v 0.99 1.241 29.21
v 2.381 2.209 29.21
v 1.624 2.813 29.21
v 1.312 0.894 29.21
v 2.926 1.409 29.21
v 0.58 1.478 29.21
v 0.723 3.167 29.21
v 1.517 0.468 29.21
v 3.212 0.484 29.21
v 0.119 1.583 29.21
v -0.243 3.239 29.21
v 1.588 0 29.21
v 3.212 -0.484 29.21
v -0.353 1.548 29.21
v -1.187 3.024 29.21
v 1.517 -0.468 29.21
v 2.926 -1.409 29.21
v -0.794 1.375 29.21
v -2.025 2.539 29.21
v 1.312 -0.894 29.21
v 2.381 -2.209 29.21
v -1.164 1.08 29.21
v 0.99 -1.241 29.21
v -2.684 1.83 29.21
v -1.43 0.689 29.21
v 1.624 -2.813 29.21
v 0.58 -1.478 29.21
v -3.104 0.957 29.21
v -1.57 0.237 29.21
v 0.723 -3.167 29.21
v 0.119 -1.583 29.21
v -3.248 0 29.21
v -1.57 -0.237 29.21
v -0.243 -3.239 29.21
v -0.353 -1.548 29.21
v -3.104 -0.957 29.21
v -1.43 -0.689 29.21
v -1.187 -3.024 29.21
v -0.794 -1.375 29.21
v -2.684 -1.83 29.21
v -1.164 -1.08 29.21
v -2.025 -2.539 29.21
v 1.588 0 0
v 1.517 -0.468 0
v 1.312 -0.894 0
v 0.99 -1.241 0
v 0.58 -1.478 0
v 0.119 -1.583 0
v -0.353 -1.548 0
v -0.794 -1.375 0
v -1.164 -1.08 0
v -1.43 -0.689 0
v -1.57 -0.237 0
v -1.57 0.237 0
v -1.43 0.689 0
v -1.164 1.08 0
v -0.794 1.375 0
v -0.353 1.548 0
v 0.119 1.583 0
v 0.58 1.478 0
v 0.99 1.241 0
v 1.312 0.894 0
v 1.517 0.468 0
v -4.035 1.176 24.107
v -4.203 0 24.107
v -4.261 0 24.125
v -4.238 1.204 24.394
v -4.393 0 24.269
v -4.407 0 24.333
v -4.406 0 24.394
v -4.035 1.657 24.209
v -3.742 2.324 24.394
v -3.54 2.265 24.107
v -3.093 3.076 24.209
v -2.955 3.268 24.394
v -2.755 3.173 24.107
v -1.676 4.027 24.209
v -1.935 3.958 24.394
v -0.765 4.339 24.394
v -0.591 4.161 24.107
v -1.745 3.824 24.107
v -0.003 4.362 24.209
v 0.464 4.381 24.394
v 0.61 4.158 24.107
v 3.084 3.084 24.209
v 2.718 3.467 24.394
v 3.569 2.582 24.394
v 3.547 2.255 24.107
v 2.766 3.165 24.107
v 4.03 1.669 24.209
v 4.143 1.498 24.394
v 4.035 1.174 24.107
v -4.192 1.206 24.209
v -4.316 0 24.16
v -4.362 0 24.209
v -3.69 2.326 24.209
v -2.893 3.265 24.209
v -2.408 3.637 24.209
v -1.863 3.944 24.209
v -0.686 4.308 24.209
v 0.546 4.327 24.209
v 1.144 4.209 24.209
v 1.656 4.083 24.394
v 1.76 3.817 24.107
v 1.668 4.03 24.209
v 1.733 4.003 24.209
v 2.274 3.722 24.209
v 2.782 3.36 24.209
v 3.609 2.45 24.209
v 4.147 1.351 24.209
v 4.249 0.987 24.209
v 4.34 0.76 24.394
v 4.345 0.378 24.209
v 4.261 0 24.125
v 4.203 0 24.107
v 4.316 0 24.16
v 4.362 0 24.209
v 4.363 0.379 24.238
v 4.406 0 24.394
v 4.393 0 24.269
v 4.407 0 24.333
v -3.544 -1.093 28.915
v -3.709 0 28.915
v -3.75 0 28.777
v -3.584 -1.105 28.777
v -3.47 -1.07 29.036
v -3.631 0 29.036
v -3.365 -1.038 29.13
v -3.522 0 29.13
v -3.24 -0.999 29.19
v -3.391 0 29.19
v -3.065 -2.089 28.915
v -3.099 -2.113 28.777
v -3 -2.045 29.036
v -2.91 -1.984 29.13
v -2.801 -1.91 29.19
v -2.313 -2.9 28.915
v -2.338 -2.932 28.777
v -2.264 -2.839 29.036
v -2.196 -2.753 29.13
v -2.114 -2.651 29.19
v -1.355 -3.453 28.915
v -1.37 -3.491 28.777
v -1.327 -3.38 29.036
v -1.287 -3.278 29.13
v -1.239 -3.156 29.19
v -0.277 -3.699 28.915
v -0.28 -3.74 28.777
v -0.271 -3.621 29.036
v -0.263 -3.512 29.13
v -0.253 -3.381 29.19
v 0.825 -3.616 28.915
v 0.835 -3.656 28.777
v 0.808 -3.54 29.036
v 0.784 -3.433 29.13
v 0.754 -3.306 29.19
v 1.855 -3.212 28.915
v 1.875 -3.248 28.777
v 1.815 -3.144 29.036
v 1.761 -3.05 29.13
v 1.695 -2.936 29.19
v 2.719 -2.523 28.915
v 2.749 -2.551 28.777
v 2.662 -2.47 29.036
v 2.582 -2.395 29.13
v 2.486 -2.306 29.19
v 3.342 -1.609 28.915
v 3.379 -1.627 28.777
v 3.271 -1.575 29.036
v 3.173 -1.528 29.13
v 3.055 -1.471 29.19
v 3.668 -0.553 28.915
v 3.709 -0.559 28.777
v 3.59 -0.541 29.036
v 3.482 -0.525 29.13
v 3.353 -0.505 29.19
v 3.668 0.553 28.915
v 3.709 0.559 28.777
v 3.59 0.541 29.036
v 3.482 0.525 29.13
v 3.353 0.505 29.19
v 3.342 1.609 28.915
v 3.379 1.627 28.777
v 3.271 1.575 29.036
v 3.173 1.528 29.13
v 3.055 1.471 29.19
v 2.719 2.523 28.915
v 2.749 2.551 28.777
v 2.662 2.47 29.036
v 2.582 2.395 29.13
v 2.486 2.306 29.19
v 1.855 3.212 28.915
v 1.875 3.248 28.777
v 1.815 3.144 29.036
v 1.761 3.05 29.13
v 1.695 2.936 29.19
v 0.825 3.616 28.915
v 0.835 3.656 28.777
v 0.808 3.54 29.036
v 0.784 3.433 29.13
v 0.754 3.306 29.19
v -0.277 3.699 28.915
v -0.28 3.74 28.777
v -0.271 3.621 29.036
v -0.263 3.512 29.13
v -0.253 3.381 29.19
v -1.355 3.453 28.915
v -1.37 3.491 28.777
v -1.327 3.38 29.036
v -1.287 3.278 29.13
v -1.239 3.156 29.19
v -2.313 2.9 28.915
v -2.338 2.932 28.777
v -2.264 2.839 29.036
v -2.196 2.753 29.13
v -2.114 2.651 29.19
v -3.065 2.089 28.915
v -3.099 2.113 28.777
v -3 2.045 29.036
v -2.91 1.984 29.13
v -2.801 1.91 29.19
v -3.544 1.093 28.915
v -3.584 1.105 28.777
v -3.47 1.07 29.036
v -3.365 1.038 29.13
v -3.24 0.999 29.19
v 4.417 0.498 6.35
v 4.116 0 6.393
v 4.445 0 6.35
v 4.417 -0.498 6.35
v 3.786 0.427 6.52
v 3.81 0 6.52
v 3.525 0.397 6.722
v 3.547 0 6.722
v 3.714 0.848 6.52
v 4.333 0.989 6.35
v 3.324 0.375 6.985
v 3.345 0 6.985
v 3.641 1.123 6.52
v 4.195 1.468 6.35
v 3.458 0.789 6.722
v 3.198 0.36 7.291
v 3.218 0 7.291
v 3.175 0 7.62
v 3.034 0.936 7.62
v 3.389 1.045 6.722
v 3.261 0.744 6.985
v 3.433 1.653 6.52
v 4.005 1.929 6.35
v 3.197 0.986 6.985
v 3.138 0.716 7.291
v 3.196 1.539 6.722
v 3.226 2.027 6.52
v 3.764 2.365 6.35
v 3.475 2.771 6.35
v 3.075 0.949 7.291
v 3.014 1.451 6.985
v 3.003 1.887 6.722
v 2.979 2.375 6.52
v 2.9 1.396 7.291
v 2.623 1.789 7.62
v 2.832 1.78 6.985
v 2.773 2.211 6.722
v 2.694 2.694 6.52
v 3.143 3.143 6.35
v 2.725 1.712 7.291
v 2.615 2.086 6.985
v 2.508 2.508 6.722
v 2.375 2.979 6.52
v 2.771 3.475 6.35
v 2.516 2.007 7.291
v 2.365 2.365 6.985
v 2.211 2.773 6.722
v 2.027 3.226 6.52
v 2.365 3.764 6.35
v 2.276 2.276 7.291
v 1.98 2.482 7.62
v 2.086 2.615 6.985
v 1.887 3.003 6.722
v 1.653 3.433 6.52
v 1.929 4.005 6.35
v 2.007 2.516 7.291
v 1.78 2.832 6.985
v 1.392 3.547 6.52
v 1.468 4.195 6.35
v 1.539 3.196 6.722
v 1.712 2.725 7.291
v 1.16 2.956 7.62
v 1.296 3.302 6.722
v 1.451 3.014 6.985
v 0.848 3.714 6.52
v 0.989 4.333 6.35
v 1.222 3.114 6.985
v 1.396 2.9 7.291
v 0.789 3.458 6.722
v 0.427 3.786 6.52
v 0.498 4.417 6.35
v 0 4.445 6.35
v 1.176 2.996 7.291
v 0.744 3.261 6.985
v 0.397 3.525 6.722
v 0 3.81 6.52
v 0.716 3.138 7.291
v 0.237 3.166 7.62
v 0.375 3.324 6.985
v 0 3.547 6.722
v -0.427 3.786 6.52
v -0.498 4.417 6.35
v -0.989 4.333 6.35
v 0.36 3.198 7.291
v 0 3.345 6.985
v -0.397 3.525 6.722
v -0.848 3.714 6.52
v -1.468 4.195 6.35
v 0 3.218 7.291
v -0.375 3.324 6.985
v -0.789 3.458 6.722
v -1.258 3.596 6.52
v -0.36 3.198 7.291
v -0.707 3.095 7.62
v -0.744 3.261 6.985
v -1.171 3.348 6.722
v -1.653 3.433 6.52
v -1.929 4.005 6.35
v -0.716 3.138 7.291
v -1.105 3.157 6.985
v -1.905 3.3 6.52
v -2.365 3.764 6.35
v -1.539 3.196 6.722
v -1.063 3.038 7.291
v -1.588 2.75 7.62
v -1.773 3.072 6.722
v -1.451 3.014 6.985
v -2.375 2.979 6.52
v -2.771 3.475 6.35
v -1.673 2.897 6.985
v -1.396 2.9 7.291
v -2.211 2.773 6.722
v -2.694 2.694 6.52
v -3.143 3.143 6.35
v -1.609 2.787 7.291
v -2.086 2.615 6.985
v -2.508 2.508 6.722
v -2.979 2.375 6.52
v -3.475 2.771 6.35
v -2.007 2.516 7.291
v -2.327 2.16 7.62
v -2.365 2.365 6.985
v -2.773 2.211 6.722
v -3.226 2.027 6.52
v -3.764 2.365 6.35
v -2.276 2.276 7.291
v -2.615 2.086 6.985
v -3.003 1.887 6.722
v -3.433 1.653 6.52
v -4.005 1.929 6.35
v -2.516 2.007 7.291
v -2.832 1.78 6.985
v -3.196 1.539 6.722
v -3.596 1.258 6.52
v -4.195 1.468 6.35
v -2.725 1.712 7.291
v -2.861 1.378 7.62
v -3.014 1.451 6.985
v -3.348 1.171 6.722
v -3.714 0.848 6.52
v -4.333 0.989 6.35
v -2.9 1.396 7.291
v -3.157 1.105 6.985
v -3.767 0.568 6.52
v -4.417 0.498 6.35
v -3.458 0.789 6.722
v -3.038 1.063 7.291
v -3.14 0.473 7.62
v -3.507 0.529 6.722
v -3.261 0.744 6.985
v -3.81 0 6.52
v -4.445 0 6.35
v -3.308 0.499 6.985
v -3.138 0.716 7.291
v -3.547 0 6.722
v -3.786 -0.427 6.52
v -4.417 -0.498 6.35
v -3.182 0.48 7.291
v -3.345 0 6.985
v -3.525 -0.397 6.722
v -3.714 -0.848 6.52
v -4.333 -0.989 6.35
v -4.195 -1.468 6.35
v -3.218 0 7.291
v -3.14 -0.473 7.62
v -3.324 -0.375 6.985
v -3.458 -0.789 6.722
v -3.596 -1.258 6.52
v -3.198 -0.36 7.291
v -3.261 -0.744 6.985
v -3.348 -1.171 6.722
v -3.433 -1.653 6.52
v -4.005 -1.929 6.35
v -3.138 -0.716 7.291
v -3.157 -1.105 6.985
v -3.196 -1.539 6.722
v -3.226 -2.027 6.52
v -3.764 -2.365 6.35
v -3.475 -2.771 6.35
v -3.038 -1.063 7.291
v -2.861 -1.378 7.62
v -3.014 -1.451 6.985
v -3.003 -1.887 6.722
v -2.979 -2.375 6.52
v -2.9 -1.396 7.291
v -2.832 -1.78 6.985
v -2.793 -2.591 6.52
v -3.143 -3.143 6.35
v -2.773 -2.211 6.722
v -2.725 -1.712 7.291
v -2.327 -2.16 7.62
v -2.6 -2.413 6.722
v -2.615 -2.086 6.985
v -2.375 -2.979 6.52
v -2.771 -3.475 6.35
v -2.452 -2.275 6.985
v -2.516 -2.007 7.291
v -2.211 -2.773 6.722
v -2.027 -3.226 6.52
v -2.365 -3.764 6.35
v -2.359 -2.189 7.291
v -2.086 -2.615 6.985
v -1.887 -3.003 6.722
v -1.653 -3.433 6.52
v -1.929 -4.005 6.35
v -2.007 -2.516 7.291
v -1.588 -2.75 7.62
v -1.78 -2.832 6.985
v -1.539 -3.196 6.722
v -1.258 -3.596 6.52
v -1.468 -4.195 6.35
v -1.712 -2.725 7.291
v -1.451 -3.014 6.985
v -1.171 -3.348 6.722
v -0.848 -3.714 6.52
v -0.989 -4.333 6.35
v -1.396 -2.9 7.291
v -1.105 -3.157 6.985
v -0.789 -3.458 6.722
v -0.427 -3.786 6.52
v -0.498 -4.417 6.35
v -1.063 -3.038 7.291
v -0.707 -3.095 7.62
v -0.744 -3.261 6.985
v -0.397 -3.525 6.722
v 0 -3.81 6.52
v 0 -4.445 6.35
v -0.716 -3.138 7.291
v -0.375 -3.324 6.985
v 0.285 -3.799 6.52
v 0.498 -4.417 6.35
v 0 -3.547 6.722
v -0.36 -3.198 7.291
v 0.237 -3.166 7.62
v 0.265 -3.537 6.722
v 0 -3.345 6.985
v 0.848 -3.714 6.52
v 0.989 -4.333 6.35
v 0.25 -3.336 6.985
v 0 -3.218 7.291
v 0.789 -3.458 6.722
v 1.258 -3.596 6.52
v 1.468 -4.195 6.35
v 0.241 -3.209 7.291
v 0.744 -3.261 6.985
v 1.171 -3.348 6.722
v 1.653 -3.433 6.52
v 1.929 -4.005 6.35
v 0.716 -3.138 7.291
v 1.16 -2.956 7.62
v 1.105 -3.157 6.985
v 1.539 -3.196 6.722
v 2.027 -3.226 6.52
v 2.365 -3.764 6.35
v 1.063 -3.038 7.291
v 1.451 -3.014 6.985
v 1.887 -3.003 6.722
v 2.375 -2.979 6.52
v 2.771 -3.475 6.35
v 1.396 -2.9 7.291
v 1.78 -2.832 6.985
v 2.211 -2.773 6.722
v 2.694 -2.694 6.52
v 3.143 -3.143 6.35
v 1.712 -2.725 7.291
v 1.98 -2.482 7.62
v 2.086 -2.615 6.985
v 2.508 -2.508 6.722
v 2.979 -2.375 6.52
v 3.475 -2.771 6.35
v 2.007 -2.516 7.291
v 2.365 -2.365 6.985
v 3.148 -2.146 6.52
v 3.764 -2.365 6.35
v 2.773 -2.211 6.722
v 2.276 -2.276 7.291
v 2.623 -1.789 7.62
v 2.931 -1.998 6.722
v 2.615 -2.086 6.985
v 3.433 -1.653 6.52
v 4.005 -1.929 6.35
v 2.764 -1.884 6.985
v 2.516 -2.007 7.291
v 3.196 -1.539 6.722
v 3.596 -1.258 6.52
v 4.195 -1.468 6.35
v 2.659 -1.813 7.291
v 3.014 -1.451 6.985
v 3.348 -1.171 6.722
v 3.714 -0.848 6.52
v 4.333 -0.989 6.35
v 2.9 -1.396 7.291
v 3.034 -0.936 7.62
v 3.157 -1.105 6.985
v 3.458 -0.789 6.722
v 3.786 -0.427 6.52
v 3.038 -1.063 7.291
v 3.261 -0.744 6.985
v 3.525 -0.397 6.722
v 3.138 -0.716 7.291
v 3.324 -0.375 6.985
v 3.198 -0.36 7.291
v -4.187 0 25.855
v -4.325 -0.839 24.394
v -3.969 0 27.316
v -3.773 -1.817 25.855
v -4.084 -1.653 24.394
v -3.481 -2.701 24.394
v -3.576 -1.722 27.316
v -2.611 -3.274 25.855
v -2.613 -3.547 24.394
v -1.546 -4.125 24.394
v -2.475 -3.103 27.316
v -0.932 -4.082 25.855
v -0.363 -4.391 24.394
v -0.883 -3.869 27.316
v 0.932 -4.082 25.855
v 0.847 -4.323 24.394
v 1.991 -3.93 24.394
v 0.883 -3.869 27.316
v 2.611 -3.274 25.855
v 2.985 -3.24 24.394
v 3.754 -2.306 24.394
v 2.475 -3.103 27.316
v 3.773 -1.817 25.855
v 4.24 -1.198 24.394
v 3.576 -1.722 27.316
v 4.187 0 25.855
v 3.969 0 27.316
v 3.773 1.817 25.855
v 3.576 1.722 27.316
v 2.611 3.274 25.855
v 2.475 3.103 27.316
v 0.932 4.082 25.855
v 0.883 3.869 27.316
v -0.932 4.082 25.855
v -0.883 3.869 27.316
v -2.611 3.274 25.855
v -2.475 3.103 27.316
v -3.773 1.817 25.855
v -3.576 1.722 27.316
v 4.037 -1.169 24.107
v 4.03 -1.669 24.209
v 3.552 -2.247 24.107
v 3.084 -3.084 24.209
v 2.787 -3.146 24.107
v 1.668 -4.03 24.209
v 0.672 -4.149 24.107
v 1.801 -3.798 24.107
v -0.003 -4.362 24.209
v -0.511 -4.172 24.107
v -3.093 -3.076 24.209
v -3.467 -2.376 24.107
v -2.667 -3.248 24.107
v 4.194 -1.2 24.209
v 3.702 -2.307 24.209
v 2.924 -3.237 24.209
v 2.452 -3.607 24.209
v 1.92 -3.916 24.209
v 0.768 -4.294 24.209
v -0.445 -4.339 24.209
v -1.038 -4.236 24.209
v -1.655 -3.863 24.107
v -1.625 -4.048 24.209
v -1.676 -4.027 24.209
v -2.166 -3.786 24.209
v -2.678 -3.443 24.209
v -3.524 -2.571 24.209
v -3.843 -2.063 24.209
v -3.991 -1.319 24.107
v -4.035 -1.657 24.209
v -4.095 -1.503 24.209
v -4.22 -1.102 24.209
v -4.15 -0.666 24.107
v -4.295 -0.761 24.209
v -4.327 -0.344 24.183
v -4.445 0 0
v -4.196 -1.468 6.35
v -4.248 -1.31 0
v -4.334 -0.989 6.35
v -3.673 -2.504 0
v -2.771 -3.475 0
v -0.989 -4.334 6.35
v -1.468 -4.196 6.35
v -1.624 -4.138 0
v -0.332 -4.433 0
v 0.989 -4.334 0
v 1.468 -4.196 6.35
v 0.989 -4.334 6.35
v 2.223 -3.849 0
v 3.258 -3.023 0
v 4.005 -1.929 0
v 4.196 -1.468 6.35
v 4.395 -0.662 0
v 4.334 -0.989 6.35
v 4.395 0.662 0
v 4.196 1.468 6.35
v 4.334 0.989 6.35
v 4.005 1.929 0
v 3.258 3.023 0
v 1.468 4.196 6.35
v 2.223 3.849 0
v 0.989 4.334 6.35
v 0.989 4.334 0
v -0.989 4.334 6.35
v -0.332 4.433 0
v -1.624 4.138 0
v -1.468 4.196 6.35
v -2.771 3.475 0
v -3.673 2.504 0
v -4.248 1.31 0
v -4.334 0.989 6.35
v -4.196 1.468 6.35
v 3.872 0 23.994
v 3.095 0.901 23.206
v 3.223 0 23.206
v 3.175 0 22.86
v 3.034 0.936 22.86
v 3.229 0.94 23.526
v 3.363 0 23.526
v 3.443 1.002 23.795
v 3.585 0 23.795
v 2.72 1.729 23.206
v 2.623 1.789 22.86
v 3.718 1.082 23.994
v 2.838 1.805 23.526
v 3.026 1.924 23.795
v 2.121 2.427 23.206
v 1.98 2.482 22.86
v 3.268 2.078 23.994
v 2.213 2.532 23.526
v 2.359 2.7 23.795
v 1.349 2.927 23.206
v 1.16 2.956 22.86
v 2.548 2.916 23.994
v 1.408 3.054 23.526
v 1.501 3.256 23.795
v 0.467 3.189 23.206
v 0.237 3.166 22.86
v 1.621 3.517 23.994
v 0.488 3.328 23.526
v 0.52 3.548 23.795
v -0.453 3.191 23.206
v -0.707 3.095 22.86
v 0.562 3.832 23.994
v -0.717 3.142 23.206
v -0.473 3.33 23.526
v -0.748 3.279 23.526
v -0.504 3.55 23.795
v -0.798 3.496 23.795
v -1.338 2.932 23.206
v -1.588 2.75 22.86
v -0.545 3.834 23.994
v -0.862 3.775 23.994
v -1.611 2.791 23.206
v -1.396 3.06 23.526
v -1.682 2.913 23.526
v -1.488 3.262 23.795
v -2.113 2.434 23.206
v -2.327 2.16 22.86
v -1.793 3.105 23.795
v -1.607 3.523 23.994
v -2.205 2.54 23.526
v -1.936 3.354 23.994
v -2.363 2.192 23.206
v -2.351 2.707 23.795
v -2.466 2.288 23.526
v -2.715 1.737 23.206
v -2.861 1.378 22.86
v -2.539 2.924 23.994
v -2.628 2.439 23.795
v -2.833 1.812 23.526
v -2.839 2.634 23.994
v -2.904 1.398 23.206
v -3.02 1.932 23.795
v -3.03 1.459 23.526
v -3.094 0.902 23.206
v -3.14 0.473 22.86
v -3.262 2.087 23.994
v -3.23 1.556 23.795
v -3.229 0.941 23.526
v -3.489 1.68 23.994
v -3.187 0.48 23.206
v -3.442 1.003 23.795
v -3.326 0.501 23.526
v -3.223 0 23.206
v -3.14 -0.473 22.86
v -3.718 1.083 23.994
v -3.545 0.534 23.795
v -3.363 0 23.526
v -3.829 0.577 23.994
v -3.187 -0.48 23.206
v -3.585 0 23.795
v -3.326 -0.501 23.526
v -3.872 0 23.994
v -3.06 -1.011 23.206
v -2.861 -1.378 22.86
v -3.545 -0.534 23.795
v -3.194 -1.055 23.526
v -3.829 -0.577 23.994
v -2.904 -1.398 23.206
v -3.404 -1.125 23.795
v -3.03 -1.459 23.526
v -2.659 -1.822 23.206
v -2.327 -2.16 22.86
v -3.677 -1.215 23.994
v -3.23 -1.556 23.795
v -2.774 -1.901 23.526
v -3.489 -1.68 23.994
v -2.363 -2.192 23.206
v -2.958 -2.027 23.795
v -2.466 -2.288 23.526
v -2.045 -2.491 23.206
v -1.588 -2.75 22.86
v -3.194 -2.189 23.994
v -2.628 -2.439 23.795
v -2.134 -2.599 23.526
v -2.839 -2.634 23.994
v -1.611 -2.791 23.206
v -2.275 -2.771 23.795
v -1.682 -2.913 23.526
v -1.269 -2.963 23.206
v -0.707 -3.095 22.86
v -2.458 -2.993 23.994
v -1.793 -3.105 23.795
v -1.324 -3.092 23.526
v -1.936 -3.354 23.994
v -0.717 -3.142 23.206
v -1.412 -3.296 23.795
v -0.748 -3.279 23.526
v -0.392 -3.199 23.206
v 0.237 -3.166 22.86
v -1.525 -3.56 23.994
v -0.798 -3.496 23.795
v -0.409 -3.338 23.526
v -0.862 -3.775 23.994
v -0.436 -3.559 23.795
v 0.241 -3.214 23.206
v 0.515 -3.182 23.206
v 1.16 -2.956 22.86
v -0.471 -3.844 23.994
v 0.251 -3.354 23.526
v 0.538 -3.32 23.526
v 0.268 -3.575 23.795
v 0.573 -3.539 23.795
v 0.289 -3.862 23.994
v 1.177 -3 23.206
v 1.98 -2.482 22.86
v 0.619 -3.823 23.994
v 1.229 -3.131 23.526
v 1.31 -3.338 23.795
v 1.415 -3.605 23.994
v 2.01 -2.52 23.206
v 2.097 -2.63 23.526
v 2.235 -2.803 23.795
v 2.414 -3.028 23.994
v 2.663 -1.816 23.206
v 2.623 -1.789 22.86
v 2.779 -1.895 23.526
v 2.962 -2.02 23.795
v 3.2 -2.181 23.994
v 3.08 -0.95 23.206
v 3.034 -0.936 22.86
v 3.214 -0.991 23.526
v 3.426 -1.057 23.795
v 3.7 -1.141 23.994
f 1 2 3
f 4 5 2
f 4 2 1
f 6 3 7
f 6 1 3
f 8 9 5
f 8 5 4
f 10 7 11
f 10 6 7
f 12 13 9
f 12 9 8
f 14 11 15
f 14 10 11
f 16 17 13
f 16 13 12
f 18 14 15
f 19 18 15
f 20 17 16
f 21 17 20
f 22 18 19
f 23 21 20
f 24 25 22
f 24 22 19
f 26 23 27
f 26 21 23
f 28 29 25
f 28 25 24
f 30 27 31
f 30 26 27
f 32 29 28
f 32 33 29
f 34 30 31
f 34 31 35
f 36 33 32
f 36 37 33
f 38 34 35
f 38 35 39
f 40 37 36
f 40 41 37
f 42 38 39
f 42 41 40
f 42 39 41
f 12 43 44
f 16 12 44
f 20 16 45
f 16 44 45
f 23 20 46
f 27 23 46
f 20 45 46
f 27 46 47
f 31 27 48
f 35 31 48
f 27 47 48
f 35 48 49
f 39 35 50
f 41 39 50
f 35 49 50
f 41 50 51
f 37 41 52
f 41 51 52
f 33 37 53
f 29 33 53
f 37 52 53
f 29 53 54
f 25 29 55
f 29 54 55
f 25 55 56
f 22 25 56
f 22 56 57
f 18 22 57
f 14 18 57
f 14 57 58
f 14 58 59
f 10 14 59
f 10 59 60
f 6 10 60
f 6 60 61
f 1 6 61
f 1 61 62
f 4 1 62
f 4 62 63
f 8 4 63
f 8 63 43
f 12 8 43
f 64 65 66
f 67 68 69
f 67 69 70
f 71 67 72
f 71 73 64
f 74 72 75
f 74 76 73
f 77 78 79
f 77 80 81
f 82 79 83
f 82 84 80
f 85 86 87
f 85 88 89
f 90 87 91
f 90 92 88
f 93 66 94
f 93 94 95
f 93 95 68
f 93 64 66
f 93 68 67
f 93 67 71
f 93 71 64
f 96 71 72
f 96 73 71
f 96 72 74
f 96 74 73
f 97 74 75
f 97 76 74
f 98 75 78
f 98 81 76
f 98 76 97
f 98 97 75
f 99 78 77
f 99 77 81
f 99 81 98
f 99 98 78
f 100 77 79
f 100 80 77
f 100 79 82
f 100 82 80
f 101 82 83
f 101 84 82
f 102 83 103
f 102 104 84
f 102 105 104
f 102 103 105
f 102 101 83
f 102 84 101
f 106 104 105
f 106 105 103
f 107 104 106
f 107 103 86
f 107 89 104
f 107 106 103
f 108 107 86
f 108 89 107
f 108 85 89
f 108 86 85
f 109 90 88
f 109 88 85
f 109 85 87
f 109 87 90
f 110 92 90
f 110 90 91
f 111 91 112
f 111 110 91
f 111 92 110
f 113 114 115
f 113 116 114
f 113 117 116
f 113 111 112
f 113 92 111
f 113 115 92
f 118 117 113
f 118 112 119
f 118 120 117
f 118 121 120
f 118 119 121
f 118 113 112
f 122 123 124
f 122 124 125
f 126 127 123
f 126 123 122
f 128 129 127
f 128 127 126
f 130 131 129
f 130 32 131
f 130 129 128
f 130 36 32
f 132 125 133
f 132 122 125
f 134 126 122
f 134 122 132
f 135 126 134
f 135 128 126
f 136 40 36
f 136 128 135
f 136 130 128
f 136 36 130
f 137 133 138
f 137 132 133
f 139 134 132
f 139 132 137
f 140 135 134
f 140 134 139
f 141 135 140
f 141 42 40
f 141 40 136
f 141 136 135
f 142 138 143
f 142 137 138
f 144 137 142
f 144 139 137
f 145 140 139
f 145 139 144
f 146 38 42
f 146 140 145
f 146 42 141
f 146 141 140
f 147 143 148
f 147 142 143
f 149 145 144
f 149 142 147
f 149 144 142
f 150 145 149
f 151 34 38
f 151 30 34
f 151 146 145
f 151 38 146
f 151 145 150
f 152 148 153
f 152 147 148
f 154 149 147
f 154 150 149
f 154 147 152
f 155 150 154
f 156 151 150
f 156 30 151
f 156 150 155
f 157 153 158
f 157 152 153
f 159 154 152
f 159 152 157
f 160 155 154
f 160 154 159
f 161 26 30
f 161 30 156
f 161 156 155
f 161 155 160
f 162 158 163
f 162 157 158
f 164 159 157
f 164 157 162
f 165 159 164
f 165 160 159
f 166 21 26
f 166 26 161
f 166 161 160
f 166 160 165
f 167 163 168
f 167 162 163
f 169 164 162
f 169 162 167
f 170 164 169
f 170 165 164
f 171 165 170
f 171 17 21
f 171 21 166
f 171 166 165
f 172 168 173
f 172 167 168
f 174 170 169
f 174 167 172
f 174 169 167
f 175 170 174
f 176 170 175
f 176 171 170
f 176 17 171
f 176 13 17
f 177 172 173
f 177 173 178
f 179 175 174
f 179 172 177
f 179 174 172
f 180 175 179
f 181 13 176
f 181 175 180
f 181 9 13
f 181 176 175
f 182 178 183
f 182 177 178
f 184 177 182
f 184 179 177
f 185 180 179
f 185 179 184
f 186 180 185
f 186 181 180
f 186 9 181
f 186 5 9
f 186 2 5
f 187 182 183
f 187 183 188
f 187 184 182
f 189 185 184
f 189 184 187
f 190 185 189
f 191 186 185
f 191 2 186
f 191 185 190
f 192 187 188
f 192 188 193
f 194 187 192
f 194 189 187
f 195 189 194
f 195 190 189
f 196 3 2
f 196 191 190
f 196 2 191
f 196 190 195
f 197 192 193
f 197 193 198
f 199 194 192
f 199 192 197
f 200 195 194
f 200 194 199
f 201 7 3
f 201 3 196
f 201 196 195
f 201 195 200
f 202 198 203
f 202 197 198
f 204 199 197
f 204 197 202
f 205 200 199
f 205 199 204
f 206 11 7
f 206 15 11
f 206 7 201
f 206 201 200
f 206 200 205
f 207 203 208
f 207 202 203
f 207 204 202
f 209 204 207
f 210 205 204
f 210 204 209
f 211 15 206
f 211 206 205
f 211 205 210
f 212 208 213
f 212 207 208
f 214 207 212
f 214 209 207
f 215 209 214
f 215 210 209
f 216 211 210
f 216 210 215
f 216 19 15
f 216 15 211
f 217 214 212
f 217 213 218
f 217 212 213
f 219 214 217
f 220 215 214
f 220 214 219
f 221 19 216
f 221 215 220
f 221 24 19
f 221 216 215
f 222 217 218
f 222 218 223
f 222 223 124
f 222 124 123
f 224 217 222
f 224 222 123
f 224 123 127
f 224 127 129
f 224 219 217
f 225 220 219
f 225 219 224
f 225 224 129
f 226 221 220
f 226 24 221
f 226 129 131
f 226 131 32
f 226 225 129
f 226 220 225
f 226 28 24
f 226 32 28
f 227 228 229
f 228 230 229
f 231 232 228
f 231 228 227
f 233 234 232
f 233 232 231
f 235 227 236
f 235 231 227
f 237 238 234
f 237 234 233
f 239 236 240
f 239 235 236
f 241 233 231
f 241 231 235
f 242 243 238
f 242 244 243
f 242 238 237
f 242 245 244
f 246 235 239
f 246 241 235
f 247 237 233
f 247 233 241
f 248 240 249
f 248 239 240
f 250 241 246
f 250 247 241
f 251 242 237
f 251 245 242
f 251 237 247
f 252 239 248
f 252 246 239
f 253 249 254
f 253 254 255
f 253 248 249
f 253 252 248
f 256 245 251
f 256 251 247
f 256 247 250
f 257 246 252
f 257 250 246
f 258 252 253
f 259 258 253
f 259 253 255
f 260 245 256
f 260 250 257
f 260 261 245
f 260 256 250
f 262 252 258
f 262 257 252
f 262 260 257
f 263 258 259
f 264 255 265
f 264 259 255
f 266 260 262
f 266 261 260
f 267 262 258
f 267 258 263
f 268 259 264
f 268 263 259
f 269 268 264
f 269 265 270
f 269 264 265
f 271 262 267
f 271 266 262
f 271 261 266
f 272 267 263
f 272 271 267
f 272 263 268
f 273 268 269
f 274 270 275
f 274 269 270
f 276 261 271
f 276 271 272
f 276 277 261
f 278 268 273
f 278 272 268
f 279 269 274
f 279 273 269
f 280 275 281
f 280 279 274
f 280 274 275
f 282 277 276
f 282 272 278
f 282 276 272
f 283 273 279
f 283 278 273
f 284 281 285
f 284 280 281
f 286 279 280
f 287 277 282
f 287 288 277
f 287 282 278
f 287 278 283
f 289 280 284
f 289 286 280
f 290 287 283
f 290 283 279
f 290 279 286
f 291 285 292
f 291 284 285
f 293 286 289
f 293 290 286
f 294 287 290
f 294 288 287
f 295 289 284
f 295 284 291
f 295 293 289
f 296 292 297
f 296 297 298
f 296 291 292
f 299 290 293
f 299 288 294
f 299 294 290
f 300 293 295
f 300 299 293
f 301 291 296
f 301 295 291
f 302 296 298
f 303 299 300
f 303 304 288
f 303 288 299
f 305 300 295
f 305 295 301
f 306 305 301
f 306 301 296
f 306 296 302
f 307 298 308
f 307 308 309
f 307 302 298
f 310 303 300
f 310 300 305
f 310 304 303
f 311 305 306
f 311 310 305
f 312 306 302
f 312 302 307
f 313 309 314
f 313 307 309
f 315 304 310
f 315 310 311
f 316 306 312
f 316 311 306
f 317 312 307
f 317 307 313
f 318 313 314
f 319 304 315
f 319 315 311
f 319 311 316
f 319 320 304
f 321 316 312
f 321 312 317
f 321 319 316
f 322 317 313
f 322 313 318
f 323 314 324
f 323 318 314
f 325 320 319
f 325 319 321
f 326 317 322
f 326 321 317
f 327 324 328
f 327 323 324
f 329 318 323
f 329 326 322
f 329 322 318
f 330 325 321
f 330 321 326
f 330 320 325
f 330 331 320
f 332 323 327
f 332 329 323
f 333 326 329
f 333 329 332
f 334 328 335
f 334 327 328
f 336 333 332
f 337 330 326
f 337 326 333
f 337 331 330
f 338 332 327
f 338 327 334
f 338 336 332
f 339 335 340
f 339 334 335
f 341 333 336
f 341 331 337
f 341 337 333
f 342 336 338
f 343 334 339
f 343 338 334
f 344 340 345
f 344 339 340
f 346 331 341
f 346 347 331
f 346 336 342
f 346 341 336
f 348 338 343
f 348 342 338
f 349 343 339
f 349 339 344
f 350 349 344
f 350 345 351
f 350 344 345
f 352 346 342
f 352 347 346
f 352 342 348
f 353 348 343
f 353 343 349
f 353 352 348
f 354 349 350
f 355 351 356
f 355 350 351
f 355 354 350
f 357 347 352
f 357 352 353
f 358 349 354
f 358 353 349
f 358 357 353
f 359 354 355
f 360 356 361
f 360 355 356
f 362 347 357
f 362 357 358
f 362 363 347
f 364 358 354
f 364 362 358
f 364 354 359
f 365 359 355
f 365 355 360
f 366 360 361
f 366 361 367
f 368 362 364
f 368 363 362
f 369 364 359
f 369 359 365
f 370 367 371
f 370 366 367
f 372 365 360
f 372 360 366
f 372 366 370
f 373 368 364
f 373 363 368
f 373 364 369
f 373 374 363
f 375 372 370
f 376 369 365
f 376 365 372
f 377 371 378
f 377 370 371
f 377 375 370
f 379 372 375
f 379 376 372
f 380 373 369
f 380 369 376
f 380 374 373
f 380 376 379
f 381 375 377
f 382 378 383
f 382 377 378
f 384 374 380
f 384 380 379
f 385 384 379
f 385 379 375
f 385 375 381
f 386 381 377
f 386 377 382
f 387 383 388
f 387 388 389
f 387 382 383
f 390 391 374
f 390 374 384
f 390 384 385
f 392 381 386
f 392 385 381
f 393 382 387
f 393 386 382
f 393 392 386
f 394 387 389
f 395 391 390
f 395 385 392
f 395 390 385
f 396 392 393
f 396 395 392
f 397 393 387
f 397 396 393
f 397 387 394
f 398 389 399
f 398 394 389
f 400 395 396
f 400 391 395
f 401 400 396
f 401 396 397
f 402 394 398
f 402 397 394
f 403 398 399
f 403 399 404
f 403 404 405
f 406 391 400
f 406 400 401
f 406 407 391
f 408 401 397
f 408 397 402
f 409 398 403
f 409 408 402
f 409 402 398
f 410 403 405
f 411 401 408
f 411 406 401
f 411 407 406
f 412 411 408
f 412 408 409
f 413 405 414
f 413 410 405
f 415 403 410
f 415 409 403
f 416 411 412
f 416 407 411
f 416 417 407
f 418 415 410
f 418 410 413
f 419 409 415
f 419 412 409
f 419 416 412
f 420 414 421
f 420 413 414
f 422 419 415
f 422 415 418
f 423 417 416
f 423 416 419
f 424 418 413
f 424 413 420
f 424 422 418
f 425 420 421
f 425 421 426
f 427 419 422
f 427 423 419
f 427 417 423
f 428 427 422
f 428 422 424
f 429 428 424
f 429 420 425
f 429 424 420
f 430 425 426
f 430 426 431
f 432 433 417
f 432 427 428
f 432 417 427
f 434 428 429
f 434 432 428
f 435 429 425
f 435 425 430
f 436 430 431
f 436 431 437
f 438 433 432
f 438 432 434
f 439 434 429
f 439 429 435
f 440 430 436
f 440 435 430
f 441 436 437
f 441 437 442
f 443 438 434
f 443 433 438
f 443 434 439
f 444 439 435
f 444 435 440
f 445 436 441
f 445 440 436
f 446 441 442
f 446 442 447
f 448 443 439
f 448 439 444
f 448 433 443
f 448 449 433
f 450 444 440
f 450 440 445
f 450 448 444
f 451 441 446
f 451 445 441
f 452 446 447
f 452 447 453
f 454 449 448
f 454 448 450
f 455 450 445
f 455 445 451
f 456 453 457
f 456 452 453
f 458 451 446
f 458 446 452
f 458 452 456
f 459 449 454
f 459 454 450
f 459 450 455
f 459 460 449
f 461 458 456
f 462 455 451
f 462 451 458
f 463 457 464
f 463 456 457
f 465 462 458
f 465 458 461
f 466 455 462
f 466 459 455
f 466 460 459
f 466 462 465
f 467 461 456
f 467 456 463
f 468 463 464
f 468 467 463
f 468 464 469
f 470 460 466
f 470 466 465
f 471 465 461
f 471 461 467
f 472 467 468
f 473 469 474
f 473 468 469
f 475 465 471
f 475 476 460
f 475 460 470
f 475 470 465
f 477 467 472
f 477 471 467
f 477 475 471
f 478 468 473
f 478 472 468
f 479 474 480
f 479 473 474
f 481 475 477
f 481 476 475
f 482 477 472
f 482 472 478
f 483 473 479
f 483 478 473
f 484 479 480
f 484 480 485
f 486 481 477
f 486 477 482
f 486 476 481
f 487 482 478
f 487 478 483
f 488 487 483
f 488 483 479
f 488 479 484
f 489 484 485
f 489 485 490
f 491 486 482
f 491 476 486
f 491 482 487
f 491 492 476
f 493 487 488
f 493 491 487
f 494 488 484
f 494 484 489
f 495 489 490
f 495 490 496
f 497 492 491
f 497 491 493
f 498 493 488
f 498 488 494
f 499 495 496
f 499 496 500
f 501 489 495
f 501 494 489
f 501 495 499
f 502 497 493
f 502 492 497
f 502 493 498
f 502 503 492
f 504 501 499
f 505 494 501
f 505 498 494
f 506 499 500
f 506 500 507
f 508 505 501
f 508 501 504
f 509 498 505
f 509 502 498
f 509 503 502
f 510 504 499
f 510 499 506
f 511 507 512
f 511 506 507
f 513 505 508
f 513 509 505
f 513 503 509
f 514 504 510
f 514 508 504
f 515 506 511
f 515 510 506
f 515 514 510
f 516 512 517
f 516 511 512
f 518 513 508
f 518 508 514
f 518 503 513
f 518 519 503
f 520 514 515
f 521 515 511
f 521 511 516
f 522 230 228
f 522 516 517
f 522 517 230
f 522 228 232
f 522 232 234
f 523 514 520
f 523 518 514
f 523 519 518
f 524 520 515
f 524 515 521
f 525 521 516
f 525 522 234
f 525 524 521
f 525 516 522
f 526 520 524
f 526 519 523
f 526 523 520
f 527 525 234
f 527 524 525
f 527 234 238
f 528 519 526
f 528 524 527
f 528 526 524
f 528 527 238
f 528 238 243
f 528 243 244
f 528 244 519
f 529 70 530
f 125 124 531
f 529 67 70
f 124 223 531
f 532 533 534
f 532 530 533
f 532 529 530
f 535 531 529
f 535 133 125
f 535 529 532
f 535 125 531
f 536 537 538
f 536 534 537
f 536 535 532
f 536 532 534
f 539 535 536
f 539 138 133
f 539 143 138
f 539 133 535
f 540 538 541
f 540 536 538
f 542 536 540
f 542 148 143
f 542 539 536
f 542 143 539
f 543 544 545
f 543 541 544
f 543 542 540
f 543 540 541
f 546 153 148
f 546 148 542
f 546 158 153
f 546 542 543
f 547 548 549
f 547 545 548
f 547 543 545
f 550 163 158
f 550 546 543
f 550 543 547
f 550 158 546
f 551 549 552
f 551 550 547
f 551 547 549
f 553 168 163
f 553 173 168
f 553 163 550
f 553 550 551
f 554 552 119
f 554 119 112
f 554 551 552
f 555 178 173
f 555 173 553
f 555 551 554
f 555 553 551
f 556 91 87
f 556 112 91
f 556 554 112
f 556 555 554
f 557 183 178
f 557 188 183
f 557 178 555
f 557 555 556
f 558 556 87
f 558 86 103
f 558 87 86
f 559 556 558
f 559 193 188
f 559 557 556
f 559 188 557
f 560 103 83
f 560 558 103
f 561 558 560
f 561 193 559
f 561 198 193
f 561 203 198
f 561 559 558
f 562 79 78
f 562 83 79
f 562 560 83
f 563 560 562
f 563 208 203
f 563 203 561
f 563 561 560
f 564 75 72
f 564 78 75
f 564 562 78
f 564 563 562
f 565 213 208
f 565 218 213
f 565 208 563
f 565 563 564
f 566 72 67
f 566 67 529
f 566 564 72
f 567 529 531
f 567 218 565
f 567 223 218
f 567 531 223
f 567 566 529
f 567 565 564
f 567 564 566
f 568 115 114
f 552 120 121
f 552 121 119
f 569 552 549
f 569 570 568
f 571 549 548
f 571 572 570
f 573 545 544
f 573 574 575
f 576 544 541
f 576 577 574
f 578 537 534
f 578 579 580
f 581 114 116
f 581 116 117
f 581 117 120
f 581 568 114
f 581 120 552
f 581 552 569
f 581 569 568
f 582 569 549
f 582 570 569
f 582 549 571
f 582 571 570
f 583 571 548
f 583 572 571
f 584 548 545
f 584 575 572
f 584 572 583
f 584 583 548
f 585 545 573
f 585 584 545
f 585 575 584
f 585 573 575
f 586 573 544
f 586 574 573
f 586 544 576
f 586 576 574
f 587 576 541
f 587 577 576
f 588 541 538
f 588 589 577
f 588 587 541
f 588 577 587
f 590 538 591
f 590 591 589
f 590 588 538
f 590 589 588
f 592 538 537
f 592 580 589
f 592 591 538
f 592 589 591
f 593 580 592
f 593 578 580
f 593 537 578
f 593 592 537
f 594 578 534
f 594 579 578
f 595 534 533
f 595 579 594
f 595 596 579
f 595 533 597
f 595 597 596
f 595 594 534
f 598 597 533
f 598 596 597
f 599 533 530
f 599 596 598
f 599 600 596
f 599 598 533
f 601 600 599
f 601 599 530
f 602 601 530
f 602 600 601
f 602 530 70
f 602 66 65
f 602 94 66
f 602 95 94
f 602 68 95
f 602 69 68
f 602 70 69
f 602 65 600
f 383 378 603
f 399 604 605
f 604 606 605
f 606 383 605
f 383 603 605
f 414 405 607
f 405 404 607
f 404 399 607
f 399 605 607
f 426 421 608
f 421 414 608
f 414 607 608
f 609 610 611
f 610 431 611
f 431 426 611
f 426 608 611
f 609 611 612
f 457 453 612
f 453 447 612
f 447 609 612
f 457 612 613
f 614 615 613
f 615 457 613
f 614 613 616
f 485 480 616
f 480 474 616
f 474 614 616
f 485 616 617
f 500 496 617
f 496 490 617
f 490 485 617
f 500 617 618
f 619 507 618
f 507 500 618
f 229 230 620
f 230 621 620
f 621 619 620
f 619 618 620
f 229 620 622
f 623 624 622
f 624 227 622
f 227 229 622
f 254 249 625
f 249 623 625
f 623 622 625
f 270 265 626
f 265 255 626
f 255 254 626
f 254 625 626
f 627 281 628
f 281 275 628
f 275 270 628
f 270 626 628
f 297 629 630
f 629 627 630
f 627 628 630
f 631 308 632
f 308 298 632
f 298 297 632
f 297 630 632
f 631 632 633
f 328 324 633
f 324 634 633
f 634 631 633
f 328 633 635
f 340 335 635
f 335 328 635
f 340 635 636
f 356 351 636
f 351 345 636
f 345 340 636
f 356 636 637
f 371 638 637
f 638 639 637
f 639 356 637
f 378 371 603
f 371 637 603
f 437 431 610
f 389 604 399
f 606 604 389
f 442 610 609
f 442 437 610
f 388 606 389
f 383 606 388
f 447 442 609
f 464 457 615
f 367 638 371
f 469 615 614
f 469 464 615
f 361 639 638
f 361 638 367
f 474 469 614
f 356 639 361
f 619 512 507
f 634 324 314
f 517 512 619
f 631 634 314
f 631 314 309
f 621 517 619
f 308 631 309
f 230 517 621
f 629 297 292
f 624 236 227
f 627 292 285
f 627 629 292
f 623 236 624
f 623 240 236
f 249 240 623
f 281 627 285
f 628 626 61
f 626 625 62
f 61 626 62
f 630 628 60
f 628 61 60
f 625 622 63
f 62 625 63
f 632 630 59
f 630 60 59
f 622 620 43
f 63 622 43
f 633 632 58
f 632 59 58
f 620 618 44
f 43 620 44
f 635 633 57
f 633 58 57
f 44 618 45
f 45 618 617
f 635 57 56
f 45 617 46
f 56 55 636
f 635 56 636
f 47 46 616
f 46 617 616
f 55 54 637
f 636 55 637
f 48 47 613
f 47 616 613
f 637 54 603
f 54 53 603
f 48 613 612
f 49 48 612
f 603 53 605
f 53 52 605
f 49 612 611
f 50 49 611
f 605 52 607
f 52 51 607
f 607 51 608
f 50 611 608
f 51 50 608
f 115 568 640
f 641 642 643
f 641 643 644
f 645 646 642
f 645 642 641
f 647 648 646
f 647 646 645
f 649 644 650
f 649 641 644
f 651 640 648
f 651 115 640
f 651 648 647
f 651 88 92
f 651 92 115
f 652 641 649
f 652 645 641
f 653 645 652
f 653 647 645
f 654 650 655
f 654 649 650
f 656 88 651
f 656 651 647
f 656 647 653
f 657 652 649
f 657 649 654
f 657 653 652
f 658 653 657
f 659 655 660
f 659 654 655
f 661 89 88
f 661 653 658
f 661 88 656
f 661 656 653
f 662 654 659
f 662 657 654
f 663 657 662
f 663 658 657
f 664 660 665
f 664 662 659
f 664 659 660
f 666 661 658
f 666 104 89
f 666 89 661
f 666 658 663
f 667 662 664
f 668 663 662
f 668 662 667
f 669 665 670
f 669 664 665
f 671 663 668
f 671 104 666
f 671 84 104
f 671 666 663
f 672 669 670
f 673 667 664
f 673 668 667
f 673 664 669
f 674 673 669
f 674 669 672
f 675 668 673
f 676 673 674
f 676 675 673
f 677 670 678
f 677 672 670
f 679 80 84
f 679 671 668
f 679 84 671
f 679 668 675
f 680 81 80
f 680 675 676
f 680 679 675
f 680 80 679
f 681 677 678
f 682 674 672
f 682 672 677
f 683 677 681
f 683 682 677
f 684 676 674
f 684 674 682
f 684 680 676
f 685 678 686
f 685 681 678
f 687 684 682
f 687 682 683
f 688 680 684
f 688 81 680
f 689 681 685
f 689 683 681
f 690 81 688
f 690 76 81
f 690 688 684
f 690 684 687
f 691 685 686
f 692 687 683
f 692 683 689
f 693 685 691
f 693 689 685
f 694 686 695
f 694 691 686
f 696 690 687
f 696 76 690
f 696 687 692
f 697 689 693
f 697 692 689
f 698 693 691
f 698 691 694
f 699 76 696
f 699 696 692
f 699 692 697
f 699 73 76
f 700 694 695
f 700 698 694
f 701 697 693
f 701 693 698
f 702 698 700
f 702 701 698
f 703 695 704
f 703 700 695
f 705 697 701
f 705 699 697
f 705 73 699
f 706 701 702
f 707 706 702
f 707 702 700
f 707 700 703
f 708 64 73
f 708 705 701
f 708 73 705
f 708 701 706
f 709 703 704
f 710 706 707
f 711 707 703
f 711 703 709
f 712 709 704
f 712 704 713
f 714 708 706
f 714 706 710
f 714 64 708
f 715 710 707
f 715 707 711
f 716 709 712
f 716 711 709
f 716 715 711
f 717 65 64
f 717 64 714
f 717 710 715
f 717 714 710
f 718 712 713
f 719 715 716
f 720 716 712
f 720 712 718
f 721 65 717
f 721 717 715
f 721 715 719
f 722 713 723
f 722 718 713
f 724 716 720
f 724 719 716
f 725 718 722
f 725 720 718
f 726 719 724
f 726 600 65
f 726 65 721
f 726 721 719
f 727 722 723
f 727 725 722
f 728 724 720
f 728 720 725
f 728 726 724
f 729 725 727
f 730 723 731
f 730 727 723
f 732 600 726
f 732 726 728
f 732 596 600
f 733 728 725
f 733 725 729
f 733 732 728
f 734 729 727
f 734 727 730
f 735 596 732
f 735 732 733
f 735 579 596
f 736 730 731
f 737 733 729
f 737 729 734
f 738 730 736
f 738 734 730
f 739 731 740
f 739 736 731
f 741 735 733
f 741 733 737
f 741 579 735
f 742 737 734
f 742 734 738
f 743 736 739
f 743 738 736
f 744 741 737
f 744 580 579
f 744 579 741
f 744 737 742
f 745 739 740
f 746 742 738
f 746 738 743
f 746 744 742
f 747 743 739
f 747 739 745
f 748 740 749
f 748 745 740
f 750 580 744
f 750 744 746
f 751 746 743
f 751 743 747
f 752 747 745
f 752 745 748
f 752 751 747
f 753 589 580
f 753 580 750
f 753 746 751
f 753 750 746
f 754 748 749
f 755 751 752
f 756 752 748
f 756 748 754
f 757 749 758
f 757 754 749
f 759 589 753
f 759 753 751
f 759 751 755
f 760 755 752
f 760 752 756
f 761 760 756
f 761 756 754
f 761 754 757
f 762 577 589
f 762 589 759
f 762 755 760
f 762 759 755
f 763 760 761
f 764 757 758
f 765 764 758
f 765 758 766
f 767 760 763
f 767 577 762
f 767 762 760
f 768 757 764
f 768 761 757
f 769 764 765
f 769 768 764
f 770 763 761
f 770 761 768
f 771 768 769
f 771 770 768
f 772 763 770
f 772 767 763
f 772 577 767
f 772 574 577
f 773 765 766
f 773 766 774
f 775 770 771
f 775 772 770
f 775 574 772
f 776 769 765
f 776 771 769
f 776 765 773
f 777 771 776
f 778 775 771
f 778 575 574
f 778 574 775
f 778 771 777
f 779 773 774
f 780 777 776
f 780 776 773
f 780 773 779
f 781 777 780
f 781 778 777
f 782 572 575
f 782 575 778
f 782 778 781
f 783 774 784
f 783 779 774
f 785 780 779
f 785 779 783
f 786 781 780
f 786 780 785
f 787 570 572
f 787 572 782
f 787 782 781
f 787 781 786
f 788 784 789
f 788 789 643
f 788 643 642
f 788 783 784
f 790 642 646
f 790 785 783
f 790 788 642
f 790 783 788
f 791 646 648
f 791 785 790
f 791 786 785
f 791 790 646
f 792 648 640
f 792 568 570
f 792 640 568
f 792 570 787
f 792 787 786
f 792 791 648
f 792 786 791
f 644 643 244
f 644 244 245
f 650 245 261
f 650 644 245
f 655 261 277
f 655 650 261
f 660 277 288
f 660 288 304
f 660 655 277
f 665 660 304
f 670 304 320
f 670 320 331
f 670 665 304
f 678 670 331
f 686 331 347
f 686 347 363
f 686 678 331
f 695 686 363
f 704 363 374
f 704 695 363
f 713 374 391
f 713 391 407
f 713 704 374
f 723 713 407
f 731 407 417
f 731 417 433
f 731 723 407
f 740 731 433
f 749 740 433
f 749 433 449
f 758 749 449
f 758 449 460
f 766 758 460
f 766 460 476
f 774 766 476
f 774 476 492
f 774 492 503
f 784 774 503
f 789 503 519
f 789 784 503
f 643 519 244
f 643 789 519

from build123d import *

# Parameters (mm, degrees)
SKETCH1_R           = 4.445
BOSS_EXTRUDE1_DEPTH = 29.21
SKETCH2_R           = 1.5875
CUT_EXTRUDE1_START  = -5.08
SKETCH3_R           = 6.35
SKETCH3_R_2         = 3.175
CUT_EXTRUDE1_DEPTH  = 17.78
FILLET1_R           = 1.27
FILLET2_R           = 1.27
CHAMFER1_SIZE       = 5.08
CHAMFER1_SIZE_2     = 0.759211087
FILLET3_R           = 0.254
FILLET4_R           = 0.508


# Some blends are built 0.0001 mm under size
with BuildPart() as part:
    # Sketch1 → Boss-Extrude1 (new body)
    with BuildSketch(Plane.XY):
        with Locations(Location((0, 0, 0), (0, 0, 180))):
            Circle(SKETCH1_R)
    extrude(amount=BOSS_EXTRUDE1_DEPTH)

    # Cut-Sweep1: sweep along a curve in space
    with BuildLine() as cut_sweep1_path:
        Line((0, 0, 29.21), (0, 0, 0))
    # Sketch2 → Cut-Sweep1 (sweep, cut)
    with BuildSketch(Plane.XY.offset(29.21)):
        Circle(SKETCH2_R)
    sweep(path=cut_sweep1_path.line, mode=Mode.SUBTRACT)

    # Sketch3 → Cut-Extrude1 (cut)
    with BuildSketch(Plane.XY.offset(29.21).offset(CUT_EXTRUDE1_START)):
        Circle(SKETCH3_R)
        Circle(SKETCH3_R_2, mode=Mode.SUBTRACT)
    extrude(amount=-CUT_EXTRUDE1_DEPTH, mode=Mode.SUBTRACT)

    # Fillet1
    fillet1_edges = [part.edges().sort_by_distance(p)[0] for p in [
        (-3.175, 0, 6.35),
    ]]
    fillet(fillet1_edges, radius=FILLET1_R - 0.0001)  # a hair under: the kernel refuses the full size

    # Fillet2
    fillet2_edges = [part.edges().sort_by_distance(p)[0] for p in [
        (-3.175, 0, 24.13),
    ]]
    fillet(fillet2_edges, radius=FILLET2_R - 0.0001)  # a hair under: the kernel refuses the full size

    # Chamfer1
    # the kernel refuses this chamfer: 5.08, 0.759211087 mm, written as the material it takes off along each edge
    with BuildSketch(Plane(origin=(0, 0, 29.21), x_dir=(-1, 0, 0), z_dir=(0, 1, 0))) as chamfer1_piece_1:
        Polygon((4.445, -CHAMFER1_SIZE), (4.445 - CHAMFER1_SIZE_2, 0), (4.445, 0), align=None)
    revolve(axis=Axis((0, 0, 29.21), (0, 0, 1)), mode=Mode.SUBTRACT)

    # Fillet3
    fillet3_edges = [part.edges().sort_by_distance(p)[0] for p in [
        (4.445, 0, 24.13),
    ]]
    fillet(fillet3_edges, radius=FILLET3_R)

    # Fillet4
    fillet4_edges = [part.edges().sort_by_distance(p)[0] for p in [
        (3.685788913, 0, 29.21),
    ]]
    fillet(fillet4_edges, radius=FILLET4_R)


solid = part.part
